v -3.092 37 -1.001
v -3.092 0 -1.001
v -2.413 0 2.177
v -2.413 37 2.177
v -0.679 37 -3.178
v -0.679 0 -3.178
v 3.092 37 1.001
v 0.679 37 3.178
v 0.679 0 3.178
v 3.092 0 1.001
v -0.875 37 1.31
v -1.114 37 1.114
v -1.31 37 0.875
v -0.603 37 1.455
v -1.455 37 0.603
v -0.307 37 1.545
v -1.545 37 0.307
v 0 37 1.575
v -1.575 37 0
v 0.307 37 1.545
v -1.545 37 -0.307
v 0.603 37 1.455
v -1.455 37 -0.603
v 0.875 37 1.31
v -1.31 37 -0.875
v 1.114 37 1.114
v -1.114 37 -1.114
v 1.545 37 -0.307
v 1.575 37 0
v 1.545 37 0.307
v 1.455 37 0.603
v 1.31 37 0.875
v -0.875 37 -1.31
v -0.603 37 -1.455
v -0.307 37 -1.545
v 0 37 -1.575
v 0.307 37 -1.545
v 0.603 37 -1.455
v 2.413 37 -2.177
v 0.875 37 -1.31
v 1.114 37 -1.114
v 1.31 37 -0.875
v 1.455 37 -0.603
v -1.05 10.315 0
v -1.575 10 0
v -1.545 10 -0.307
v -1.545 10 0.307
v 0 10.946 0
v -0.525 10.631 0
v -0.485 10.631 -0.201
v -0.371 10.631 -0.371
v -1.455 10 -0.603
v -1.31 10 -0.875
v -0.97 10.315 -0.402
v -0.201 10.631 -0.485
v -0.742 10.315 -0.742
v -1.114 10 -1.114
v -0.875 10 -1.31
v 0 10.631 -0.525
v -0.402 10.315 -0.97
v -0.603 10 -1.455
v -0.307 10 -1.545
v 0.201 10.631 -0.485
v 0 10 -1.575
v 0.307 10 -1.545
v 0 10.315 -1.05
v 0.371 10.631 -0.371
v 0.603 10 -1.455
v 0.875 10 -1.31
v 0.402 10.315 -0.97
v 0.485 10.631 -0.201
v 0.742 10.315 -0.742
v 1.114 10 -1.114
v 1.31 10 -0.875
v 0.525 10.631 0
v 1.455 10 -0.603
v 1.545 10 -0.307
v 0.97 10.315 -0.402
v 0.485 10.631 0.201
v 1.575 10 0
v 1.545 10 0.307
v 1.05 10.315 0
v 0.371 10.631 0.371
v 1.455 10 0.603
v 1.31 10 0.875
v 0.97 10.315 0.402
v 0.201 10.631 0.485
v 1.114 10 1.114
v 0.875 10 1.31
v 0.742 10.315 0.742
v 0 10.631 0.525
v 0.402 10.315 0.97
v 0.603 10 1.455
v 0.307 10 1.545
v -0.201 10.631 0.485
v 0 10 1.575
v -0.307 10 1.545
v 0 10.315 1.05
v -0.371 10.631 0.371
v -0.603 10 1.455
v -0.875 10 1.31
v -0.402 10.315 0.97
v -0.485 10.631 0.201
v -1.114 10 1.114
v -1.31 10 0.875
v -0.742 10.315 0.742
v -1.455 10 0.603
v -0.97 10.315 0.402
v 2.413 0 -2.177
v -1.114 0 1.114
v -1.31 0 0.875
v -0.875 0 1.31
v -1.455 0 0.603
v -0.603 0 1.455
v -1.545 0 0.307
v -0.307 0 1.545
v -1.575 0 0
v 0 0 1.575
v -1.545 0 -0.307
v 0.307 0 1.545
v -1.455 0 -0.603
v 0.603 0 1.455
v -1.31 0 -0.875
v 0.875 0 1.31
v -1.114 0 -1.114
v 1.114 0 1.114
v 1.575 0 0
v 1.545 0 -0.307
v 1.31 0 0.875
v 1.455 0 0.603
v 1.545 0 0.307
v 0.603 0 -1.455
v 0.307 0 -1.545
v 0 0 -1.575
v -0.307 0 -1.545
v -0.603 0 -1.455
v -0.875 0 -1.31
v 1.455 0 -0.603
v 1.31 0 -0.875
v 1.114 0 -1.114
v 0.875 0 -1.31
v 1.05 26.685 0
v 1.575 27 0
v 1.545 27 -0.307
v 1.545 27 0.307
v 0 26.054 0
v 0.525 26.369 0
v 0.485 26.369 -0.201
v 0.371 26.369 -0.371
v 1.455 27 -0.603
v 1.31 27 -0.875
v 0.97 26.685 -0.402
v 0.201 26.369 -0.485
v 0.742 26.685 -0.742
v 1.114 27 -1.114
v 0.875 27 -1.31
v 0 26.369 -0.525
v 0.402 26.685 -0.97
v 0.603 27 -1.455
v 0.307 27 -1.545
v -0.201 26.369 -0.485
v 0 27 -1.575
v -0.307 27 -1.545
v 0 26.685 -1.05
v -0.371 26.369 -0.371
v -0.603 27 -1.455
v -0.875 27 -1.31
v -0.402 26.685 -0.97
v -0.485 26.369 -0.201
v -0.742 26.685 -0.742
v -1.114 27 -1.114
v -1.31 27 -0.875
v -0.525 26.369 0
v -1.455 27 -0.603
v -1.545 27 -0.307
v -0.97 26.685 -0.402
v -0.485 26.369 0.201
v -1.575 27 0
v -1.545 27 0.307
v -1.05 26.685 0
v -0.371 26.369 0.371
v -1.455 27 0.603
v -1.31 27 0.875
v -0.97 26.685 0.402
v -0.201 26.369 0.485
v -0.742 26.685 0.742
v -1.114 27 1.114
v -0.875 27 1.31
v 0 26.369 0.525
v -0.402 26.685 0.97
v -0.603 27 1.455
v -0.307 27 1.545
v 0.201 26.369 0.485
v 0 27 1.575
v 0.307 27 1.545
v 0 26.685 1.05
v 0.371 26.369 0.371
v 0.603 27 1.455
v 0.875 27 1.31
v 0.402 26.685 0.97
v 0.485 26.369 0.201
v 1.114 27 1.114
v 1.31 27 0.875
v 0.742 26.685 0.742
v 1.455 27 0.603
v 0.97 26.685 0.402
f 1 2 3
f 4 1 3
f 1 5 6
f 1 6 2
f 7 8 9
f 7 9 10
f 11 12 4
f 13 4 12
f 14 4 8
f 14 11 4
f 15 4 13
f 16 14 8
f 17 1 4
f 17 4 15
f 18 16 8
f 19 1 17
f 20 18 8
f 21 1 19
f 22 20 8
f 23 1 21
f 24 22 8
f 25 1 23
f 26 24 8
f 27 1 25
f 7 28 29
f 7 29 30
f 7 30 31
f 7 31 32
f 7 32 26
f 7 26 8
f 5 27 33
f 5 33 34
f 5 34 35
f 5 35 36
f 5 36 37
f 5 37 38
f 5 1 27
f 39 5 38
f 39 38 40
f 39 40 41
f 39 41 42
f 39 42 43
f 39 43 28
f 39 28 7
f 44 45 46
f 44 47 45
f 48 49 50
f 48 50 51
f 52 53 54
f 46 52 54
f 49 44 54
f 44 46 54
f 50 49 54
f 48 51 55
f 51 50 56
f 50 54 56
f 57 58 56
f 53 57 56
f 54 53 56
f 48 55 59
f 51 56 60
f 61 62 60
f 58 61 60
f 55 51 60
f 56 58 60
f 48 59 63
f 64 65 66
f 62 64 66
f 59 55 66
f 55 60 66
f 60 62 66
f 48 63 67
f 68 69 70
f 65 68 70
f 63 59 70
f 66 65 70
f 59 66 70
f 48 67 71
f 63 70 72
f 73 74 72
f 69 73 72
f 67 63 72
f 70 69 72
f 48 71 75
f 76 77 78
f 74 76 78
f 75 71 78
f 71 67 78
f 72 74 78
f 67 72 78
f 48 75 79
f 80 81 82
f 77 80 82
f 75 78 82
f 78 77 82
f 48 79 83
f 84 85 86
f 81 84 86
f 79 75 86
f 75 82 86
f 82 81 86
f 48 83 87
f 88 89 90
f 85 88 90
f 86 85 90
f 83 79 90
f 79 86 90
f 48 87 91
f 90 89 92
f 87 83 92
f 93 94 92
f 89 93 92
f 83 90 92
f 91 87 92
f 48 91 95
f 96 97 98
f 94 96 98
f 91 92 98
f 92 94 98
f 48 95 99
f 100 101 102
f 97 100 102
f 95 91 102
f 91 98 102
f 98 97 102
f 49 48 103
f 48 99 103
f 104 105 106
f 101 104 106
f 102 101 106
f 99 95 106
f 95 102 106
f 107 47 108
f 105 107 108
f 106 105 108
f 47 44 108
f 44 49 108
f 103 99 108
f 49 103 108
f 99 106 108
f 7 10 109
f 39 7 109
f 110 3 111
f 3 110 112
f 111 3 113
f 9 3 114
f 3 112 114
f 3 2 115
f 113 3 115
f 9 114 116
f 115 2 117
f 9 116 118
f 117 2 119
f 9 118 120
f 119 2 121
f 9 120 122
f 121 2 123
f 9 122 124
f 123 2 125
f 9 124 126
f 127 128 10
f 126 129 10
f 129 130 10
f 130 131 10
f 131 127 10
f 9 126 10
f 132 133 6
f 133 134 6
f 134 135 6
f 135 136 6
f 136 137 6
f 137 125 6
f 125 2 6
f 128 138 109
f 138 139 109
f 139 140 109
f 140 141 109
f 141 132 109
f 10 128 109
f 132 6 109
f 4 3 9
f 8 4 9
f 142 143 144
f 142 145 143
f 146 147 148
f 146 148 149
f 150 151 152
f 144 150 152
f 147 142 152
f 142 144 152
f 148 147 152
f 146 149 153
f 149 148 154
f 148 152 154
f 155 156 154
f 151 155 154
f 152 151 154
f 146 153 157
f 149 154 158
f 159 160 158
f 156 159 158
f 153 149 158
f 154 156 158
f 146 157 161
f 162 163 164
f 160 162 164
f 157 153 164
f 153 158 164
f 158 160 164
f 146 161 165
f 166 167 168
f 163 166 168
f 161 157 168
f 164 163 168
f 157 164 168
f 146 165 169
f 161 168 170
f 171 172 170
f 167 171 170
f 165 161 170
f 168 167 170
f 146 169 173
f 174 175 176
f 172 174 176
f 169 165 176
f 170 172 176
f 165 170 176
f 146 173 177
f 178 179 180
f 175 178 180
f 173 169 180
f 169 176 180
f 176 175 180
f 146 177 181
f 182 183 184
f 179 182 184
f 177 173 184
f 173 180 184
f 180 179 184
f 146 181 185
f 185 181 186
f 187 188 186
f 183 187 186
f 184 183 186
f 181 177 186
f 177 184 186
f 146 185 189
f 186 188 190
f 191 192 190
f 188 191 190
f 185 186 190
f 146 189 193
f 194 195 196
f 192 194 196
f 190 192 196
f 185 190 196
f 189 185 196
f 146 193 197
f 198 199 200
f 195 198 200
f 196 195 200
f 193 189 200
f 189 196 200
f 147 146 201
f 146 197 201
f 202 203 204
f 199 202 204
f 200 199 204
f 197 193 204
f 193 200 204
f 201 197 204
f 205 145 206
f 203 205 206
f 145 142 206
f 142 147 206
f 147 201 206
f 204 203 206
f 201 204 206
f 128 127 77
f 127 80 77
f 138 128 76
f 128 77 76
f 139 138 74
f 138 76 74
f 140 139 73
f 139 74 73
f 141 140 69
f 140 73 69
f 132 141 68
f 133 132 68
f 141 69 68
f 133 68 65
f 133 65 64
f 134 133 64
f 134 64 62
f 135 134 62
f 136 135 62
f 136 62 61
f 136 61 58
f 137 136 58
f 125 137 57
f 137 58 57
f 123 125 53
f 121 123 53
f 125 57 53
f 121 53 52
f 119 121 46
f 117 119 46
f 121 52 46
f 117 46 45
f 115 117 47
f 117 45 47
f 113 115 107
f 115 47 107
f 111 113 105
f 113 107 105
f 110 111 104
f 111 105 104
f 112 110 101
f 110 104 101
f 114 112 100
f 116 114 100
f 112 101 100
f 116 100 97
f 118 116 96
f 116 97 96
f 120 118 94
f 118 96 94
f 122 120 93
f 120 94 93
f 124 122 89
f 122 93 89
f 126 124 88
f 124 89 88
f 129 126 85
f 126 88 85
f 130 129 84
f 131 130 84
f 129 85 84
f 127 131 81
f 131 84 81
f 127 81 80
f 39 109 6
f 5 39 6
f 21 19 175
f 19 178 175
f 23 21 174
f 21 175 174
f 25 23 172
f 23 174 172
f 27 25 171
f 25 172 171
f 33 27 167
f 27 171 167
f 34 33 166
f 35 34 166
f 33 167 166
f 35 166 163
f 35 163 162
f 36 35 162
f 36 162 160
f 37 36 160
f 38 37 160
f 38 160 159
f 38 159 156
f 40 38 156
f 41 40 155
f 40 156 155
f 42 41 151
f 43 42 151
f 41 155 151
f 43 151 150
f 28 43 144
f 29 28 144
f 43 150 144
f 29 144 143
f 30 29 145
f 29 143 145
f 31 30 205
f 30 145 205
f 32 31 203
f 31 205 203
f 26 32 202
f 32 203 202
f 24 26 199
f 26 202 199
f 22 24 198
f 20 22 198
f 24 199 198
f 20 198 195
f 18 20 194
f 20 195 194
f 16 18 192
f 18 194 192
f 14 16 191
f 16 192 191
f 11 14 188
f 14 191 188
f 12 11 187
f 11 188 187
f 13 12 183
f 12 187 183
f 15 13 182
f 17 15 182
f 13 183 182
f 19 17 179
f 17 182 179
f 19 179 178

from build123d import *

# Parameters (mm, degrees)
RESSALTO_EXTRUS_O1_DEPTH                    = 37
FURO_ROSCADO_PARA_CONDU_TE_DE_M3X0_51_D     = 3.15
FURO_ROSCADO_PARA_CONDU_TE_DE_M3X0_51_DEPTH = 10
FURO_ROSCADO_PARA_CONDU_TE_DE_M3X0_51_TIP   = 0.946355475
FURO_ROSCADO_PARA_CONDU_TE_DE_M3X0_52_D     = 3.15
FURO_ROSCADO_PARA_CONDU_TE_DE_M3X0_52_DEPTH = 10
FURO_ROSCADO_PARA_CONDU_TE_DE_M3X0_52_TIP   = 0.946355475


with BuildPart() as part:
    # Esboço1 → Ressalto-extrusão1 (new body)
    with BuildSketch(Plane(origin=(0, 0, 0), x_dir=(1, 0, 0), z_dir=(0, 1, 0))):
        Polygon((3.092003015, -1.00100817), (2.412900012, 2.177249074), (-0.679103003, 3.178257244), (-3.092003015, 1.00100817), (-2.412900012, -2.177249074), (0.679103003, -3.178257244), align=None)
    extrude(amount=RESSALTO_EXTRUS_O1_DEPTH)

    # Furo roscado para conduíte de M3x0.51
    with Locations(Plane(origin=(0, 0, 0), x_dir=(-1, 0, 0), z_dir=(0, -1, 0))):
        with Locations((0, 0)):
            Hole(FURO_ROSCADO_PARA_CONDU_TE_DE_M3X0_51_D / 2, depth=FURO_ROSCADO_PARA_CONDU_TE_DE_M3X0_51_DEPTH)
            with Locations((0, 0, -(FURO_ROSCADO_PARA_CONDU_TE_DE_M3X0_51_DEPTH + FURO_ROSCADO_PARA_CONDU_TE_DE_M3X0_51_TIP / 2))):  # 118° drill point
                Cone(0, FURO_ROSCADO_PARA_CONDU_TE_DE_M3X0_51_D / 2, FURO_ROSCADO_PARA_CONDU_TE_DE_M3X0_51_TIP, mode=Mode.SUBTRACT)

    # Furo roscado para conduíte de M3x0.52
    with Locations(Plane(origin=(0, 37, 0), x_dir=(1, 0, 0), z_dir=(0, 1, 0))):
        with Locations((0, 0)):
            Hole(FURO_ROSCADO_PARA_CONDU_TE_DE_M3X0_52_D / 2, depth=FURO_ROSCADO_PARA_CONDU_TE_DE_M3X0_52_DEPTH)
            with Locations((0, 0, -(FURO_ROSCADO_PARA_CONDU_TE_DE_M3X0_52_DEPTH + FURO_ROSCADO_PARA_CONDU_TE_DE_M3X0_52_TIP / 2))):  # 118° drill point
                Cone(0, FURO_ROSCADO_PARA_CONDU_TE_DE_M3X0_52_D / 2, FURO_ROSCADO_PARA_CONDU_TE_DE_M3X0_52_TIP, mode=Mode.SUBTRACT)


solid = part.part
